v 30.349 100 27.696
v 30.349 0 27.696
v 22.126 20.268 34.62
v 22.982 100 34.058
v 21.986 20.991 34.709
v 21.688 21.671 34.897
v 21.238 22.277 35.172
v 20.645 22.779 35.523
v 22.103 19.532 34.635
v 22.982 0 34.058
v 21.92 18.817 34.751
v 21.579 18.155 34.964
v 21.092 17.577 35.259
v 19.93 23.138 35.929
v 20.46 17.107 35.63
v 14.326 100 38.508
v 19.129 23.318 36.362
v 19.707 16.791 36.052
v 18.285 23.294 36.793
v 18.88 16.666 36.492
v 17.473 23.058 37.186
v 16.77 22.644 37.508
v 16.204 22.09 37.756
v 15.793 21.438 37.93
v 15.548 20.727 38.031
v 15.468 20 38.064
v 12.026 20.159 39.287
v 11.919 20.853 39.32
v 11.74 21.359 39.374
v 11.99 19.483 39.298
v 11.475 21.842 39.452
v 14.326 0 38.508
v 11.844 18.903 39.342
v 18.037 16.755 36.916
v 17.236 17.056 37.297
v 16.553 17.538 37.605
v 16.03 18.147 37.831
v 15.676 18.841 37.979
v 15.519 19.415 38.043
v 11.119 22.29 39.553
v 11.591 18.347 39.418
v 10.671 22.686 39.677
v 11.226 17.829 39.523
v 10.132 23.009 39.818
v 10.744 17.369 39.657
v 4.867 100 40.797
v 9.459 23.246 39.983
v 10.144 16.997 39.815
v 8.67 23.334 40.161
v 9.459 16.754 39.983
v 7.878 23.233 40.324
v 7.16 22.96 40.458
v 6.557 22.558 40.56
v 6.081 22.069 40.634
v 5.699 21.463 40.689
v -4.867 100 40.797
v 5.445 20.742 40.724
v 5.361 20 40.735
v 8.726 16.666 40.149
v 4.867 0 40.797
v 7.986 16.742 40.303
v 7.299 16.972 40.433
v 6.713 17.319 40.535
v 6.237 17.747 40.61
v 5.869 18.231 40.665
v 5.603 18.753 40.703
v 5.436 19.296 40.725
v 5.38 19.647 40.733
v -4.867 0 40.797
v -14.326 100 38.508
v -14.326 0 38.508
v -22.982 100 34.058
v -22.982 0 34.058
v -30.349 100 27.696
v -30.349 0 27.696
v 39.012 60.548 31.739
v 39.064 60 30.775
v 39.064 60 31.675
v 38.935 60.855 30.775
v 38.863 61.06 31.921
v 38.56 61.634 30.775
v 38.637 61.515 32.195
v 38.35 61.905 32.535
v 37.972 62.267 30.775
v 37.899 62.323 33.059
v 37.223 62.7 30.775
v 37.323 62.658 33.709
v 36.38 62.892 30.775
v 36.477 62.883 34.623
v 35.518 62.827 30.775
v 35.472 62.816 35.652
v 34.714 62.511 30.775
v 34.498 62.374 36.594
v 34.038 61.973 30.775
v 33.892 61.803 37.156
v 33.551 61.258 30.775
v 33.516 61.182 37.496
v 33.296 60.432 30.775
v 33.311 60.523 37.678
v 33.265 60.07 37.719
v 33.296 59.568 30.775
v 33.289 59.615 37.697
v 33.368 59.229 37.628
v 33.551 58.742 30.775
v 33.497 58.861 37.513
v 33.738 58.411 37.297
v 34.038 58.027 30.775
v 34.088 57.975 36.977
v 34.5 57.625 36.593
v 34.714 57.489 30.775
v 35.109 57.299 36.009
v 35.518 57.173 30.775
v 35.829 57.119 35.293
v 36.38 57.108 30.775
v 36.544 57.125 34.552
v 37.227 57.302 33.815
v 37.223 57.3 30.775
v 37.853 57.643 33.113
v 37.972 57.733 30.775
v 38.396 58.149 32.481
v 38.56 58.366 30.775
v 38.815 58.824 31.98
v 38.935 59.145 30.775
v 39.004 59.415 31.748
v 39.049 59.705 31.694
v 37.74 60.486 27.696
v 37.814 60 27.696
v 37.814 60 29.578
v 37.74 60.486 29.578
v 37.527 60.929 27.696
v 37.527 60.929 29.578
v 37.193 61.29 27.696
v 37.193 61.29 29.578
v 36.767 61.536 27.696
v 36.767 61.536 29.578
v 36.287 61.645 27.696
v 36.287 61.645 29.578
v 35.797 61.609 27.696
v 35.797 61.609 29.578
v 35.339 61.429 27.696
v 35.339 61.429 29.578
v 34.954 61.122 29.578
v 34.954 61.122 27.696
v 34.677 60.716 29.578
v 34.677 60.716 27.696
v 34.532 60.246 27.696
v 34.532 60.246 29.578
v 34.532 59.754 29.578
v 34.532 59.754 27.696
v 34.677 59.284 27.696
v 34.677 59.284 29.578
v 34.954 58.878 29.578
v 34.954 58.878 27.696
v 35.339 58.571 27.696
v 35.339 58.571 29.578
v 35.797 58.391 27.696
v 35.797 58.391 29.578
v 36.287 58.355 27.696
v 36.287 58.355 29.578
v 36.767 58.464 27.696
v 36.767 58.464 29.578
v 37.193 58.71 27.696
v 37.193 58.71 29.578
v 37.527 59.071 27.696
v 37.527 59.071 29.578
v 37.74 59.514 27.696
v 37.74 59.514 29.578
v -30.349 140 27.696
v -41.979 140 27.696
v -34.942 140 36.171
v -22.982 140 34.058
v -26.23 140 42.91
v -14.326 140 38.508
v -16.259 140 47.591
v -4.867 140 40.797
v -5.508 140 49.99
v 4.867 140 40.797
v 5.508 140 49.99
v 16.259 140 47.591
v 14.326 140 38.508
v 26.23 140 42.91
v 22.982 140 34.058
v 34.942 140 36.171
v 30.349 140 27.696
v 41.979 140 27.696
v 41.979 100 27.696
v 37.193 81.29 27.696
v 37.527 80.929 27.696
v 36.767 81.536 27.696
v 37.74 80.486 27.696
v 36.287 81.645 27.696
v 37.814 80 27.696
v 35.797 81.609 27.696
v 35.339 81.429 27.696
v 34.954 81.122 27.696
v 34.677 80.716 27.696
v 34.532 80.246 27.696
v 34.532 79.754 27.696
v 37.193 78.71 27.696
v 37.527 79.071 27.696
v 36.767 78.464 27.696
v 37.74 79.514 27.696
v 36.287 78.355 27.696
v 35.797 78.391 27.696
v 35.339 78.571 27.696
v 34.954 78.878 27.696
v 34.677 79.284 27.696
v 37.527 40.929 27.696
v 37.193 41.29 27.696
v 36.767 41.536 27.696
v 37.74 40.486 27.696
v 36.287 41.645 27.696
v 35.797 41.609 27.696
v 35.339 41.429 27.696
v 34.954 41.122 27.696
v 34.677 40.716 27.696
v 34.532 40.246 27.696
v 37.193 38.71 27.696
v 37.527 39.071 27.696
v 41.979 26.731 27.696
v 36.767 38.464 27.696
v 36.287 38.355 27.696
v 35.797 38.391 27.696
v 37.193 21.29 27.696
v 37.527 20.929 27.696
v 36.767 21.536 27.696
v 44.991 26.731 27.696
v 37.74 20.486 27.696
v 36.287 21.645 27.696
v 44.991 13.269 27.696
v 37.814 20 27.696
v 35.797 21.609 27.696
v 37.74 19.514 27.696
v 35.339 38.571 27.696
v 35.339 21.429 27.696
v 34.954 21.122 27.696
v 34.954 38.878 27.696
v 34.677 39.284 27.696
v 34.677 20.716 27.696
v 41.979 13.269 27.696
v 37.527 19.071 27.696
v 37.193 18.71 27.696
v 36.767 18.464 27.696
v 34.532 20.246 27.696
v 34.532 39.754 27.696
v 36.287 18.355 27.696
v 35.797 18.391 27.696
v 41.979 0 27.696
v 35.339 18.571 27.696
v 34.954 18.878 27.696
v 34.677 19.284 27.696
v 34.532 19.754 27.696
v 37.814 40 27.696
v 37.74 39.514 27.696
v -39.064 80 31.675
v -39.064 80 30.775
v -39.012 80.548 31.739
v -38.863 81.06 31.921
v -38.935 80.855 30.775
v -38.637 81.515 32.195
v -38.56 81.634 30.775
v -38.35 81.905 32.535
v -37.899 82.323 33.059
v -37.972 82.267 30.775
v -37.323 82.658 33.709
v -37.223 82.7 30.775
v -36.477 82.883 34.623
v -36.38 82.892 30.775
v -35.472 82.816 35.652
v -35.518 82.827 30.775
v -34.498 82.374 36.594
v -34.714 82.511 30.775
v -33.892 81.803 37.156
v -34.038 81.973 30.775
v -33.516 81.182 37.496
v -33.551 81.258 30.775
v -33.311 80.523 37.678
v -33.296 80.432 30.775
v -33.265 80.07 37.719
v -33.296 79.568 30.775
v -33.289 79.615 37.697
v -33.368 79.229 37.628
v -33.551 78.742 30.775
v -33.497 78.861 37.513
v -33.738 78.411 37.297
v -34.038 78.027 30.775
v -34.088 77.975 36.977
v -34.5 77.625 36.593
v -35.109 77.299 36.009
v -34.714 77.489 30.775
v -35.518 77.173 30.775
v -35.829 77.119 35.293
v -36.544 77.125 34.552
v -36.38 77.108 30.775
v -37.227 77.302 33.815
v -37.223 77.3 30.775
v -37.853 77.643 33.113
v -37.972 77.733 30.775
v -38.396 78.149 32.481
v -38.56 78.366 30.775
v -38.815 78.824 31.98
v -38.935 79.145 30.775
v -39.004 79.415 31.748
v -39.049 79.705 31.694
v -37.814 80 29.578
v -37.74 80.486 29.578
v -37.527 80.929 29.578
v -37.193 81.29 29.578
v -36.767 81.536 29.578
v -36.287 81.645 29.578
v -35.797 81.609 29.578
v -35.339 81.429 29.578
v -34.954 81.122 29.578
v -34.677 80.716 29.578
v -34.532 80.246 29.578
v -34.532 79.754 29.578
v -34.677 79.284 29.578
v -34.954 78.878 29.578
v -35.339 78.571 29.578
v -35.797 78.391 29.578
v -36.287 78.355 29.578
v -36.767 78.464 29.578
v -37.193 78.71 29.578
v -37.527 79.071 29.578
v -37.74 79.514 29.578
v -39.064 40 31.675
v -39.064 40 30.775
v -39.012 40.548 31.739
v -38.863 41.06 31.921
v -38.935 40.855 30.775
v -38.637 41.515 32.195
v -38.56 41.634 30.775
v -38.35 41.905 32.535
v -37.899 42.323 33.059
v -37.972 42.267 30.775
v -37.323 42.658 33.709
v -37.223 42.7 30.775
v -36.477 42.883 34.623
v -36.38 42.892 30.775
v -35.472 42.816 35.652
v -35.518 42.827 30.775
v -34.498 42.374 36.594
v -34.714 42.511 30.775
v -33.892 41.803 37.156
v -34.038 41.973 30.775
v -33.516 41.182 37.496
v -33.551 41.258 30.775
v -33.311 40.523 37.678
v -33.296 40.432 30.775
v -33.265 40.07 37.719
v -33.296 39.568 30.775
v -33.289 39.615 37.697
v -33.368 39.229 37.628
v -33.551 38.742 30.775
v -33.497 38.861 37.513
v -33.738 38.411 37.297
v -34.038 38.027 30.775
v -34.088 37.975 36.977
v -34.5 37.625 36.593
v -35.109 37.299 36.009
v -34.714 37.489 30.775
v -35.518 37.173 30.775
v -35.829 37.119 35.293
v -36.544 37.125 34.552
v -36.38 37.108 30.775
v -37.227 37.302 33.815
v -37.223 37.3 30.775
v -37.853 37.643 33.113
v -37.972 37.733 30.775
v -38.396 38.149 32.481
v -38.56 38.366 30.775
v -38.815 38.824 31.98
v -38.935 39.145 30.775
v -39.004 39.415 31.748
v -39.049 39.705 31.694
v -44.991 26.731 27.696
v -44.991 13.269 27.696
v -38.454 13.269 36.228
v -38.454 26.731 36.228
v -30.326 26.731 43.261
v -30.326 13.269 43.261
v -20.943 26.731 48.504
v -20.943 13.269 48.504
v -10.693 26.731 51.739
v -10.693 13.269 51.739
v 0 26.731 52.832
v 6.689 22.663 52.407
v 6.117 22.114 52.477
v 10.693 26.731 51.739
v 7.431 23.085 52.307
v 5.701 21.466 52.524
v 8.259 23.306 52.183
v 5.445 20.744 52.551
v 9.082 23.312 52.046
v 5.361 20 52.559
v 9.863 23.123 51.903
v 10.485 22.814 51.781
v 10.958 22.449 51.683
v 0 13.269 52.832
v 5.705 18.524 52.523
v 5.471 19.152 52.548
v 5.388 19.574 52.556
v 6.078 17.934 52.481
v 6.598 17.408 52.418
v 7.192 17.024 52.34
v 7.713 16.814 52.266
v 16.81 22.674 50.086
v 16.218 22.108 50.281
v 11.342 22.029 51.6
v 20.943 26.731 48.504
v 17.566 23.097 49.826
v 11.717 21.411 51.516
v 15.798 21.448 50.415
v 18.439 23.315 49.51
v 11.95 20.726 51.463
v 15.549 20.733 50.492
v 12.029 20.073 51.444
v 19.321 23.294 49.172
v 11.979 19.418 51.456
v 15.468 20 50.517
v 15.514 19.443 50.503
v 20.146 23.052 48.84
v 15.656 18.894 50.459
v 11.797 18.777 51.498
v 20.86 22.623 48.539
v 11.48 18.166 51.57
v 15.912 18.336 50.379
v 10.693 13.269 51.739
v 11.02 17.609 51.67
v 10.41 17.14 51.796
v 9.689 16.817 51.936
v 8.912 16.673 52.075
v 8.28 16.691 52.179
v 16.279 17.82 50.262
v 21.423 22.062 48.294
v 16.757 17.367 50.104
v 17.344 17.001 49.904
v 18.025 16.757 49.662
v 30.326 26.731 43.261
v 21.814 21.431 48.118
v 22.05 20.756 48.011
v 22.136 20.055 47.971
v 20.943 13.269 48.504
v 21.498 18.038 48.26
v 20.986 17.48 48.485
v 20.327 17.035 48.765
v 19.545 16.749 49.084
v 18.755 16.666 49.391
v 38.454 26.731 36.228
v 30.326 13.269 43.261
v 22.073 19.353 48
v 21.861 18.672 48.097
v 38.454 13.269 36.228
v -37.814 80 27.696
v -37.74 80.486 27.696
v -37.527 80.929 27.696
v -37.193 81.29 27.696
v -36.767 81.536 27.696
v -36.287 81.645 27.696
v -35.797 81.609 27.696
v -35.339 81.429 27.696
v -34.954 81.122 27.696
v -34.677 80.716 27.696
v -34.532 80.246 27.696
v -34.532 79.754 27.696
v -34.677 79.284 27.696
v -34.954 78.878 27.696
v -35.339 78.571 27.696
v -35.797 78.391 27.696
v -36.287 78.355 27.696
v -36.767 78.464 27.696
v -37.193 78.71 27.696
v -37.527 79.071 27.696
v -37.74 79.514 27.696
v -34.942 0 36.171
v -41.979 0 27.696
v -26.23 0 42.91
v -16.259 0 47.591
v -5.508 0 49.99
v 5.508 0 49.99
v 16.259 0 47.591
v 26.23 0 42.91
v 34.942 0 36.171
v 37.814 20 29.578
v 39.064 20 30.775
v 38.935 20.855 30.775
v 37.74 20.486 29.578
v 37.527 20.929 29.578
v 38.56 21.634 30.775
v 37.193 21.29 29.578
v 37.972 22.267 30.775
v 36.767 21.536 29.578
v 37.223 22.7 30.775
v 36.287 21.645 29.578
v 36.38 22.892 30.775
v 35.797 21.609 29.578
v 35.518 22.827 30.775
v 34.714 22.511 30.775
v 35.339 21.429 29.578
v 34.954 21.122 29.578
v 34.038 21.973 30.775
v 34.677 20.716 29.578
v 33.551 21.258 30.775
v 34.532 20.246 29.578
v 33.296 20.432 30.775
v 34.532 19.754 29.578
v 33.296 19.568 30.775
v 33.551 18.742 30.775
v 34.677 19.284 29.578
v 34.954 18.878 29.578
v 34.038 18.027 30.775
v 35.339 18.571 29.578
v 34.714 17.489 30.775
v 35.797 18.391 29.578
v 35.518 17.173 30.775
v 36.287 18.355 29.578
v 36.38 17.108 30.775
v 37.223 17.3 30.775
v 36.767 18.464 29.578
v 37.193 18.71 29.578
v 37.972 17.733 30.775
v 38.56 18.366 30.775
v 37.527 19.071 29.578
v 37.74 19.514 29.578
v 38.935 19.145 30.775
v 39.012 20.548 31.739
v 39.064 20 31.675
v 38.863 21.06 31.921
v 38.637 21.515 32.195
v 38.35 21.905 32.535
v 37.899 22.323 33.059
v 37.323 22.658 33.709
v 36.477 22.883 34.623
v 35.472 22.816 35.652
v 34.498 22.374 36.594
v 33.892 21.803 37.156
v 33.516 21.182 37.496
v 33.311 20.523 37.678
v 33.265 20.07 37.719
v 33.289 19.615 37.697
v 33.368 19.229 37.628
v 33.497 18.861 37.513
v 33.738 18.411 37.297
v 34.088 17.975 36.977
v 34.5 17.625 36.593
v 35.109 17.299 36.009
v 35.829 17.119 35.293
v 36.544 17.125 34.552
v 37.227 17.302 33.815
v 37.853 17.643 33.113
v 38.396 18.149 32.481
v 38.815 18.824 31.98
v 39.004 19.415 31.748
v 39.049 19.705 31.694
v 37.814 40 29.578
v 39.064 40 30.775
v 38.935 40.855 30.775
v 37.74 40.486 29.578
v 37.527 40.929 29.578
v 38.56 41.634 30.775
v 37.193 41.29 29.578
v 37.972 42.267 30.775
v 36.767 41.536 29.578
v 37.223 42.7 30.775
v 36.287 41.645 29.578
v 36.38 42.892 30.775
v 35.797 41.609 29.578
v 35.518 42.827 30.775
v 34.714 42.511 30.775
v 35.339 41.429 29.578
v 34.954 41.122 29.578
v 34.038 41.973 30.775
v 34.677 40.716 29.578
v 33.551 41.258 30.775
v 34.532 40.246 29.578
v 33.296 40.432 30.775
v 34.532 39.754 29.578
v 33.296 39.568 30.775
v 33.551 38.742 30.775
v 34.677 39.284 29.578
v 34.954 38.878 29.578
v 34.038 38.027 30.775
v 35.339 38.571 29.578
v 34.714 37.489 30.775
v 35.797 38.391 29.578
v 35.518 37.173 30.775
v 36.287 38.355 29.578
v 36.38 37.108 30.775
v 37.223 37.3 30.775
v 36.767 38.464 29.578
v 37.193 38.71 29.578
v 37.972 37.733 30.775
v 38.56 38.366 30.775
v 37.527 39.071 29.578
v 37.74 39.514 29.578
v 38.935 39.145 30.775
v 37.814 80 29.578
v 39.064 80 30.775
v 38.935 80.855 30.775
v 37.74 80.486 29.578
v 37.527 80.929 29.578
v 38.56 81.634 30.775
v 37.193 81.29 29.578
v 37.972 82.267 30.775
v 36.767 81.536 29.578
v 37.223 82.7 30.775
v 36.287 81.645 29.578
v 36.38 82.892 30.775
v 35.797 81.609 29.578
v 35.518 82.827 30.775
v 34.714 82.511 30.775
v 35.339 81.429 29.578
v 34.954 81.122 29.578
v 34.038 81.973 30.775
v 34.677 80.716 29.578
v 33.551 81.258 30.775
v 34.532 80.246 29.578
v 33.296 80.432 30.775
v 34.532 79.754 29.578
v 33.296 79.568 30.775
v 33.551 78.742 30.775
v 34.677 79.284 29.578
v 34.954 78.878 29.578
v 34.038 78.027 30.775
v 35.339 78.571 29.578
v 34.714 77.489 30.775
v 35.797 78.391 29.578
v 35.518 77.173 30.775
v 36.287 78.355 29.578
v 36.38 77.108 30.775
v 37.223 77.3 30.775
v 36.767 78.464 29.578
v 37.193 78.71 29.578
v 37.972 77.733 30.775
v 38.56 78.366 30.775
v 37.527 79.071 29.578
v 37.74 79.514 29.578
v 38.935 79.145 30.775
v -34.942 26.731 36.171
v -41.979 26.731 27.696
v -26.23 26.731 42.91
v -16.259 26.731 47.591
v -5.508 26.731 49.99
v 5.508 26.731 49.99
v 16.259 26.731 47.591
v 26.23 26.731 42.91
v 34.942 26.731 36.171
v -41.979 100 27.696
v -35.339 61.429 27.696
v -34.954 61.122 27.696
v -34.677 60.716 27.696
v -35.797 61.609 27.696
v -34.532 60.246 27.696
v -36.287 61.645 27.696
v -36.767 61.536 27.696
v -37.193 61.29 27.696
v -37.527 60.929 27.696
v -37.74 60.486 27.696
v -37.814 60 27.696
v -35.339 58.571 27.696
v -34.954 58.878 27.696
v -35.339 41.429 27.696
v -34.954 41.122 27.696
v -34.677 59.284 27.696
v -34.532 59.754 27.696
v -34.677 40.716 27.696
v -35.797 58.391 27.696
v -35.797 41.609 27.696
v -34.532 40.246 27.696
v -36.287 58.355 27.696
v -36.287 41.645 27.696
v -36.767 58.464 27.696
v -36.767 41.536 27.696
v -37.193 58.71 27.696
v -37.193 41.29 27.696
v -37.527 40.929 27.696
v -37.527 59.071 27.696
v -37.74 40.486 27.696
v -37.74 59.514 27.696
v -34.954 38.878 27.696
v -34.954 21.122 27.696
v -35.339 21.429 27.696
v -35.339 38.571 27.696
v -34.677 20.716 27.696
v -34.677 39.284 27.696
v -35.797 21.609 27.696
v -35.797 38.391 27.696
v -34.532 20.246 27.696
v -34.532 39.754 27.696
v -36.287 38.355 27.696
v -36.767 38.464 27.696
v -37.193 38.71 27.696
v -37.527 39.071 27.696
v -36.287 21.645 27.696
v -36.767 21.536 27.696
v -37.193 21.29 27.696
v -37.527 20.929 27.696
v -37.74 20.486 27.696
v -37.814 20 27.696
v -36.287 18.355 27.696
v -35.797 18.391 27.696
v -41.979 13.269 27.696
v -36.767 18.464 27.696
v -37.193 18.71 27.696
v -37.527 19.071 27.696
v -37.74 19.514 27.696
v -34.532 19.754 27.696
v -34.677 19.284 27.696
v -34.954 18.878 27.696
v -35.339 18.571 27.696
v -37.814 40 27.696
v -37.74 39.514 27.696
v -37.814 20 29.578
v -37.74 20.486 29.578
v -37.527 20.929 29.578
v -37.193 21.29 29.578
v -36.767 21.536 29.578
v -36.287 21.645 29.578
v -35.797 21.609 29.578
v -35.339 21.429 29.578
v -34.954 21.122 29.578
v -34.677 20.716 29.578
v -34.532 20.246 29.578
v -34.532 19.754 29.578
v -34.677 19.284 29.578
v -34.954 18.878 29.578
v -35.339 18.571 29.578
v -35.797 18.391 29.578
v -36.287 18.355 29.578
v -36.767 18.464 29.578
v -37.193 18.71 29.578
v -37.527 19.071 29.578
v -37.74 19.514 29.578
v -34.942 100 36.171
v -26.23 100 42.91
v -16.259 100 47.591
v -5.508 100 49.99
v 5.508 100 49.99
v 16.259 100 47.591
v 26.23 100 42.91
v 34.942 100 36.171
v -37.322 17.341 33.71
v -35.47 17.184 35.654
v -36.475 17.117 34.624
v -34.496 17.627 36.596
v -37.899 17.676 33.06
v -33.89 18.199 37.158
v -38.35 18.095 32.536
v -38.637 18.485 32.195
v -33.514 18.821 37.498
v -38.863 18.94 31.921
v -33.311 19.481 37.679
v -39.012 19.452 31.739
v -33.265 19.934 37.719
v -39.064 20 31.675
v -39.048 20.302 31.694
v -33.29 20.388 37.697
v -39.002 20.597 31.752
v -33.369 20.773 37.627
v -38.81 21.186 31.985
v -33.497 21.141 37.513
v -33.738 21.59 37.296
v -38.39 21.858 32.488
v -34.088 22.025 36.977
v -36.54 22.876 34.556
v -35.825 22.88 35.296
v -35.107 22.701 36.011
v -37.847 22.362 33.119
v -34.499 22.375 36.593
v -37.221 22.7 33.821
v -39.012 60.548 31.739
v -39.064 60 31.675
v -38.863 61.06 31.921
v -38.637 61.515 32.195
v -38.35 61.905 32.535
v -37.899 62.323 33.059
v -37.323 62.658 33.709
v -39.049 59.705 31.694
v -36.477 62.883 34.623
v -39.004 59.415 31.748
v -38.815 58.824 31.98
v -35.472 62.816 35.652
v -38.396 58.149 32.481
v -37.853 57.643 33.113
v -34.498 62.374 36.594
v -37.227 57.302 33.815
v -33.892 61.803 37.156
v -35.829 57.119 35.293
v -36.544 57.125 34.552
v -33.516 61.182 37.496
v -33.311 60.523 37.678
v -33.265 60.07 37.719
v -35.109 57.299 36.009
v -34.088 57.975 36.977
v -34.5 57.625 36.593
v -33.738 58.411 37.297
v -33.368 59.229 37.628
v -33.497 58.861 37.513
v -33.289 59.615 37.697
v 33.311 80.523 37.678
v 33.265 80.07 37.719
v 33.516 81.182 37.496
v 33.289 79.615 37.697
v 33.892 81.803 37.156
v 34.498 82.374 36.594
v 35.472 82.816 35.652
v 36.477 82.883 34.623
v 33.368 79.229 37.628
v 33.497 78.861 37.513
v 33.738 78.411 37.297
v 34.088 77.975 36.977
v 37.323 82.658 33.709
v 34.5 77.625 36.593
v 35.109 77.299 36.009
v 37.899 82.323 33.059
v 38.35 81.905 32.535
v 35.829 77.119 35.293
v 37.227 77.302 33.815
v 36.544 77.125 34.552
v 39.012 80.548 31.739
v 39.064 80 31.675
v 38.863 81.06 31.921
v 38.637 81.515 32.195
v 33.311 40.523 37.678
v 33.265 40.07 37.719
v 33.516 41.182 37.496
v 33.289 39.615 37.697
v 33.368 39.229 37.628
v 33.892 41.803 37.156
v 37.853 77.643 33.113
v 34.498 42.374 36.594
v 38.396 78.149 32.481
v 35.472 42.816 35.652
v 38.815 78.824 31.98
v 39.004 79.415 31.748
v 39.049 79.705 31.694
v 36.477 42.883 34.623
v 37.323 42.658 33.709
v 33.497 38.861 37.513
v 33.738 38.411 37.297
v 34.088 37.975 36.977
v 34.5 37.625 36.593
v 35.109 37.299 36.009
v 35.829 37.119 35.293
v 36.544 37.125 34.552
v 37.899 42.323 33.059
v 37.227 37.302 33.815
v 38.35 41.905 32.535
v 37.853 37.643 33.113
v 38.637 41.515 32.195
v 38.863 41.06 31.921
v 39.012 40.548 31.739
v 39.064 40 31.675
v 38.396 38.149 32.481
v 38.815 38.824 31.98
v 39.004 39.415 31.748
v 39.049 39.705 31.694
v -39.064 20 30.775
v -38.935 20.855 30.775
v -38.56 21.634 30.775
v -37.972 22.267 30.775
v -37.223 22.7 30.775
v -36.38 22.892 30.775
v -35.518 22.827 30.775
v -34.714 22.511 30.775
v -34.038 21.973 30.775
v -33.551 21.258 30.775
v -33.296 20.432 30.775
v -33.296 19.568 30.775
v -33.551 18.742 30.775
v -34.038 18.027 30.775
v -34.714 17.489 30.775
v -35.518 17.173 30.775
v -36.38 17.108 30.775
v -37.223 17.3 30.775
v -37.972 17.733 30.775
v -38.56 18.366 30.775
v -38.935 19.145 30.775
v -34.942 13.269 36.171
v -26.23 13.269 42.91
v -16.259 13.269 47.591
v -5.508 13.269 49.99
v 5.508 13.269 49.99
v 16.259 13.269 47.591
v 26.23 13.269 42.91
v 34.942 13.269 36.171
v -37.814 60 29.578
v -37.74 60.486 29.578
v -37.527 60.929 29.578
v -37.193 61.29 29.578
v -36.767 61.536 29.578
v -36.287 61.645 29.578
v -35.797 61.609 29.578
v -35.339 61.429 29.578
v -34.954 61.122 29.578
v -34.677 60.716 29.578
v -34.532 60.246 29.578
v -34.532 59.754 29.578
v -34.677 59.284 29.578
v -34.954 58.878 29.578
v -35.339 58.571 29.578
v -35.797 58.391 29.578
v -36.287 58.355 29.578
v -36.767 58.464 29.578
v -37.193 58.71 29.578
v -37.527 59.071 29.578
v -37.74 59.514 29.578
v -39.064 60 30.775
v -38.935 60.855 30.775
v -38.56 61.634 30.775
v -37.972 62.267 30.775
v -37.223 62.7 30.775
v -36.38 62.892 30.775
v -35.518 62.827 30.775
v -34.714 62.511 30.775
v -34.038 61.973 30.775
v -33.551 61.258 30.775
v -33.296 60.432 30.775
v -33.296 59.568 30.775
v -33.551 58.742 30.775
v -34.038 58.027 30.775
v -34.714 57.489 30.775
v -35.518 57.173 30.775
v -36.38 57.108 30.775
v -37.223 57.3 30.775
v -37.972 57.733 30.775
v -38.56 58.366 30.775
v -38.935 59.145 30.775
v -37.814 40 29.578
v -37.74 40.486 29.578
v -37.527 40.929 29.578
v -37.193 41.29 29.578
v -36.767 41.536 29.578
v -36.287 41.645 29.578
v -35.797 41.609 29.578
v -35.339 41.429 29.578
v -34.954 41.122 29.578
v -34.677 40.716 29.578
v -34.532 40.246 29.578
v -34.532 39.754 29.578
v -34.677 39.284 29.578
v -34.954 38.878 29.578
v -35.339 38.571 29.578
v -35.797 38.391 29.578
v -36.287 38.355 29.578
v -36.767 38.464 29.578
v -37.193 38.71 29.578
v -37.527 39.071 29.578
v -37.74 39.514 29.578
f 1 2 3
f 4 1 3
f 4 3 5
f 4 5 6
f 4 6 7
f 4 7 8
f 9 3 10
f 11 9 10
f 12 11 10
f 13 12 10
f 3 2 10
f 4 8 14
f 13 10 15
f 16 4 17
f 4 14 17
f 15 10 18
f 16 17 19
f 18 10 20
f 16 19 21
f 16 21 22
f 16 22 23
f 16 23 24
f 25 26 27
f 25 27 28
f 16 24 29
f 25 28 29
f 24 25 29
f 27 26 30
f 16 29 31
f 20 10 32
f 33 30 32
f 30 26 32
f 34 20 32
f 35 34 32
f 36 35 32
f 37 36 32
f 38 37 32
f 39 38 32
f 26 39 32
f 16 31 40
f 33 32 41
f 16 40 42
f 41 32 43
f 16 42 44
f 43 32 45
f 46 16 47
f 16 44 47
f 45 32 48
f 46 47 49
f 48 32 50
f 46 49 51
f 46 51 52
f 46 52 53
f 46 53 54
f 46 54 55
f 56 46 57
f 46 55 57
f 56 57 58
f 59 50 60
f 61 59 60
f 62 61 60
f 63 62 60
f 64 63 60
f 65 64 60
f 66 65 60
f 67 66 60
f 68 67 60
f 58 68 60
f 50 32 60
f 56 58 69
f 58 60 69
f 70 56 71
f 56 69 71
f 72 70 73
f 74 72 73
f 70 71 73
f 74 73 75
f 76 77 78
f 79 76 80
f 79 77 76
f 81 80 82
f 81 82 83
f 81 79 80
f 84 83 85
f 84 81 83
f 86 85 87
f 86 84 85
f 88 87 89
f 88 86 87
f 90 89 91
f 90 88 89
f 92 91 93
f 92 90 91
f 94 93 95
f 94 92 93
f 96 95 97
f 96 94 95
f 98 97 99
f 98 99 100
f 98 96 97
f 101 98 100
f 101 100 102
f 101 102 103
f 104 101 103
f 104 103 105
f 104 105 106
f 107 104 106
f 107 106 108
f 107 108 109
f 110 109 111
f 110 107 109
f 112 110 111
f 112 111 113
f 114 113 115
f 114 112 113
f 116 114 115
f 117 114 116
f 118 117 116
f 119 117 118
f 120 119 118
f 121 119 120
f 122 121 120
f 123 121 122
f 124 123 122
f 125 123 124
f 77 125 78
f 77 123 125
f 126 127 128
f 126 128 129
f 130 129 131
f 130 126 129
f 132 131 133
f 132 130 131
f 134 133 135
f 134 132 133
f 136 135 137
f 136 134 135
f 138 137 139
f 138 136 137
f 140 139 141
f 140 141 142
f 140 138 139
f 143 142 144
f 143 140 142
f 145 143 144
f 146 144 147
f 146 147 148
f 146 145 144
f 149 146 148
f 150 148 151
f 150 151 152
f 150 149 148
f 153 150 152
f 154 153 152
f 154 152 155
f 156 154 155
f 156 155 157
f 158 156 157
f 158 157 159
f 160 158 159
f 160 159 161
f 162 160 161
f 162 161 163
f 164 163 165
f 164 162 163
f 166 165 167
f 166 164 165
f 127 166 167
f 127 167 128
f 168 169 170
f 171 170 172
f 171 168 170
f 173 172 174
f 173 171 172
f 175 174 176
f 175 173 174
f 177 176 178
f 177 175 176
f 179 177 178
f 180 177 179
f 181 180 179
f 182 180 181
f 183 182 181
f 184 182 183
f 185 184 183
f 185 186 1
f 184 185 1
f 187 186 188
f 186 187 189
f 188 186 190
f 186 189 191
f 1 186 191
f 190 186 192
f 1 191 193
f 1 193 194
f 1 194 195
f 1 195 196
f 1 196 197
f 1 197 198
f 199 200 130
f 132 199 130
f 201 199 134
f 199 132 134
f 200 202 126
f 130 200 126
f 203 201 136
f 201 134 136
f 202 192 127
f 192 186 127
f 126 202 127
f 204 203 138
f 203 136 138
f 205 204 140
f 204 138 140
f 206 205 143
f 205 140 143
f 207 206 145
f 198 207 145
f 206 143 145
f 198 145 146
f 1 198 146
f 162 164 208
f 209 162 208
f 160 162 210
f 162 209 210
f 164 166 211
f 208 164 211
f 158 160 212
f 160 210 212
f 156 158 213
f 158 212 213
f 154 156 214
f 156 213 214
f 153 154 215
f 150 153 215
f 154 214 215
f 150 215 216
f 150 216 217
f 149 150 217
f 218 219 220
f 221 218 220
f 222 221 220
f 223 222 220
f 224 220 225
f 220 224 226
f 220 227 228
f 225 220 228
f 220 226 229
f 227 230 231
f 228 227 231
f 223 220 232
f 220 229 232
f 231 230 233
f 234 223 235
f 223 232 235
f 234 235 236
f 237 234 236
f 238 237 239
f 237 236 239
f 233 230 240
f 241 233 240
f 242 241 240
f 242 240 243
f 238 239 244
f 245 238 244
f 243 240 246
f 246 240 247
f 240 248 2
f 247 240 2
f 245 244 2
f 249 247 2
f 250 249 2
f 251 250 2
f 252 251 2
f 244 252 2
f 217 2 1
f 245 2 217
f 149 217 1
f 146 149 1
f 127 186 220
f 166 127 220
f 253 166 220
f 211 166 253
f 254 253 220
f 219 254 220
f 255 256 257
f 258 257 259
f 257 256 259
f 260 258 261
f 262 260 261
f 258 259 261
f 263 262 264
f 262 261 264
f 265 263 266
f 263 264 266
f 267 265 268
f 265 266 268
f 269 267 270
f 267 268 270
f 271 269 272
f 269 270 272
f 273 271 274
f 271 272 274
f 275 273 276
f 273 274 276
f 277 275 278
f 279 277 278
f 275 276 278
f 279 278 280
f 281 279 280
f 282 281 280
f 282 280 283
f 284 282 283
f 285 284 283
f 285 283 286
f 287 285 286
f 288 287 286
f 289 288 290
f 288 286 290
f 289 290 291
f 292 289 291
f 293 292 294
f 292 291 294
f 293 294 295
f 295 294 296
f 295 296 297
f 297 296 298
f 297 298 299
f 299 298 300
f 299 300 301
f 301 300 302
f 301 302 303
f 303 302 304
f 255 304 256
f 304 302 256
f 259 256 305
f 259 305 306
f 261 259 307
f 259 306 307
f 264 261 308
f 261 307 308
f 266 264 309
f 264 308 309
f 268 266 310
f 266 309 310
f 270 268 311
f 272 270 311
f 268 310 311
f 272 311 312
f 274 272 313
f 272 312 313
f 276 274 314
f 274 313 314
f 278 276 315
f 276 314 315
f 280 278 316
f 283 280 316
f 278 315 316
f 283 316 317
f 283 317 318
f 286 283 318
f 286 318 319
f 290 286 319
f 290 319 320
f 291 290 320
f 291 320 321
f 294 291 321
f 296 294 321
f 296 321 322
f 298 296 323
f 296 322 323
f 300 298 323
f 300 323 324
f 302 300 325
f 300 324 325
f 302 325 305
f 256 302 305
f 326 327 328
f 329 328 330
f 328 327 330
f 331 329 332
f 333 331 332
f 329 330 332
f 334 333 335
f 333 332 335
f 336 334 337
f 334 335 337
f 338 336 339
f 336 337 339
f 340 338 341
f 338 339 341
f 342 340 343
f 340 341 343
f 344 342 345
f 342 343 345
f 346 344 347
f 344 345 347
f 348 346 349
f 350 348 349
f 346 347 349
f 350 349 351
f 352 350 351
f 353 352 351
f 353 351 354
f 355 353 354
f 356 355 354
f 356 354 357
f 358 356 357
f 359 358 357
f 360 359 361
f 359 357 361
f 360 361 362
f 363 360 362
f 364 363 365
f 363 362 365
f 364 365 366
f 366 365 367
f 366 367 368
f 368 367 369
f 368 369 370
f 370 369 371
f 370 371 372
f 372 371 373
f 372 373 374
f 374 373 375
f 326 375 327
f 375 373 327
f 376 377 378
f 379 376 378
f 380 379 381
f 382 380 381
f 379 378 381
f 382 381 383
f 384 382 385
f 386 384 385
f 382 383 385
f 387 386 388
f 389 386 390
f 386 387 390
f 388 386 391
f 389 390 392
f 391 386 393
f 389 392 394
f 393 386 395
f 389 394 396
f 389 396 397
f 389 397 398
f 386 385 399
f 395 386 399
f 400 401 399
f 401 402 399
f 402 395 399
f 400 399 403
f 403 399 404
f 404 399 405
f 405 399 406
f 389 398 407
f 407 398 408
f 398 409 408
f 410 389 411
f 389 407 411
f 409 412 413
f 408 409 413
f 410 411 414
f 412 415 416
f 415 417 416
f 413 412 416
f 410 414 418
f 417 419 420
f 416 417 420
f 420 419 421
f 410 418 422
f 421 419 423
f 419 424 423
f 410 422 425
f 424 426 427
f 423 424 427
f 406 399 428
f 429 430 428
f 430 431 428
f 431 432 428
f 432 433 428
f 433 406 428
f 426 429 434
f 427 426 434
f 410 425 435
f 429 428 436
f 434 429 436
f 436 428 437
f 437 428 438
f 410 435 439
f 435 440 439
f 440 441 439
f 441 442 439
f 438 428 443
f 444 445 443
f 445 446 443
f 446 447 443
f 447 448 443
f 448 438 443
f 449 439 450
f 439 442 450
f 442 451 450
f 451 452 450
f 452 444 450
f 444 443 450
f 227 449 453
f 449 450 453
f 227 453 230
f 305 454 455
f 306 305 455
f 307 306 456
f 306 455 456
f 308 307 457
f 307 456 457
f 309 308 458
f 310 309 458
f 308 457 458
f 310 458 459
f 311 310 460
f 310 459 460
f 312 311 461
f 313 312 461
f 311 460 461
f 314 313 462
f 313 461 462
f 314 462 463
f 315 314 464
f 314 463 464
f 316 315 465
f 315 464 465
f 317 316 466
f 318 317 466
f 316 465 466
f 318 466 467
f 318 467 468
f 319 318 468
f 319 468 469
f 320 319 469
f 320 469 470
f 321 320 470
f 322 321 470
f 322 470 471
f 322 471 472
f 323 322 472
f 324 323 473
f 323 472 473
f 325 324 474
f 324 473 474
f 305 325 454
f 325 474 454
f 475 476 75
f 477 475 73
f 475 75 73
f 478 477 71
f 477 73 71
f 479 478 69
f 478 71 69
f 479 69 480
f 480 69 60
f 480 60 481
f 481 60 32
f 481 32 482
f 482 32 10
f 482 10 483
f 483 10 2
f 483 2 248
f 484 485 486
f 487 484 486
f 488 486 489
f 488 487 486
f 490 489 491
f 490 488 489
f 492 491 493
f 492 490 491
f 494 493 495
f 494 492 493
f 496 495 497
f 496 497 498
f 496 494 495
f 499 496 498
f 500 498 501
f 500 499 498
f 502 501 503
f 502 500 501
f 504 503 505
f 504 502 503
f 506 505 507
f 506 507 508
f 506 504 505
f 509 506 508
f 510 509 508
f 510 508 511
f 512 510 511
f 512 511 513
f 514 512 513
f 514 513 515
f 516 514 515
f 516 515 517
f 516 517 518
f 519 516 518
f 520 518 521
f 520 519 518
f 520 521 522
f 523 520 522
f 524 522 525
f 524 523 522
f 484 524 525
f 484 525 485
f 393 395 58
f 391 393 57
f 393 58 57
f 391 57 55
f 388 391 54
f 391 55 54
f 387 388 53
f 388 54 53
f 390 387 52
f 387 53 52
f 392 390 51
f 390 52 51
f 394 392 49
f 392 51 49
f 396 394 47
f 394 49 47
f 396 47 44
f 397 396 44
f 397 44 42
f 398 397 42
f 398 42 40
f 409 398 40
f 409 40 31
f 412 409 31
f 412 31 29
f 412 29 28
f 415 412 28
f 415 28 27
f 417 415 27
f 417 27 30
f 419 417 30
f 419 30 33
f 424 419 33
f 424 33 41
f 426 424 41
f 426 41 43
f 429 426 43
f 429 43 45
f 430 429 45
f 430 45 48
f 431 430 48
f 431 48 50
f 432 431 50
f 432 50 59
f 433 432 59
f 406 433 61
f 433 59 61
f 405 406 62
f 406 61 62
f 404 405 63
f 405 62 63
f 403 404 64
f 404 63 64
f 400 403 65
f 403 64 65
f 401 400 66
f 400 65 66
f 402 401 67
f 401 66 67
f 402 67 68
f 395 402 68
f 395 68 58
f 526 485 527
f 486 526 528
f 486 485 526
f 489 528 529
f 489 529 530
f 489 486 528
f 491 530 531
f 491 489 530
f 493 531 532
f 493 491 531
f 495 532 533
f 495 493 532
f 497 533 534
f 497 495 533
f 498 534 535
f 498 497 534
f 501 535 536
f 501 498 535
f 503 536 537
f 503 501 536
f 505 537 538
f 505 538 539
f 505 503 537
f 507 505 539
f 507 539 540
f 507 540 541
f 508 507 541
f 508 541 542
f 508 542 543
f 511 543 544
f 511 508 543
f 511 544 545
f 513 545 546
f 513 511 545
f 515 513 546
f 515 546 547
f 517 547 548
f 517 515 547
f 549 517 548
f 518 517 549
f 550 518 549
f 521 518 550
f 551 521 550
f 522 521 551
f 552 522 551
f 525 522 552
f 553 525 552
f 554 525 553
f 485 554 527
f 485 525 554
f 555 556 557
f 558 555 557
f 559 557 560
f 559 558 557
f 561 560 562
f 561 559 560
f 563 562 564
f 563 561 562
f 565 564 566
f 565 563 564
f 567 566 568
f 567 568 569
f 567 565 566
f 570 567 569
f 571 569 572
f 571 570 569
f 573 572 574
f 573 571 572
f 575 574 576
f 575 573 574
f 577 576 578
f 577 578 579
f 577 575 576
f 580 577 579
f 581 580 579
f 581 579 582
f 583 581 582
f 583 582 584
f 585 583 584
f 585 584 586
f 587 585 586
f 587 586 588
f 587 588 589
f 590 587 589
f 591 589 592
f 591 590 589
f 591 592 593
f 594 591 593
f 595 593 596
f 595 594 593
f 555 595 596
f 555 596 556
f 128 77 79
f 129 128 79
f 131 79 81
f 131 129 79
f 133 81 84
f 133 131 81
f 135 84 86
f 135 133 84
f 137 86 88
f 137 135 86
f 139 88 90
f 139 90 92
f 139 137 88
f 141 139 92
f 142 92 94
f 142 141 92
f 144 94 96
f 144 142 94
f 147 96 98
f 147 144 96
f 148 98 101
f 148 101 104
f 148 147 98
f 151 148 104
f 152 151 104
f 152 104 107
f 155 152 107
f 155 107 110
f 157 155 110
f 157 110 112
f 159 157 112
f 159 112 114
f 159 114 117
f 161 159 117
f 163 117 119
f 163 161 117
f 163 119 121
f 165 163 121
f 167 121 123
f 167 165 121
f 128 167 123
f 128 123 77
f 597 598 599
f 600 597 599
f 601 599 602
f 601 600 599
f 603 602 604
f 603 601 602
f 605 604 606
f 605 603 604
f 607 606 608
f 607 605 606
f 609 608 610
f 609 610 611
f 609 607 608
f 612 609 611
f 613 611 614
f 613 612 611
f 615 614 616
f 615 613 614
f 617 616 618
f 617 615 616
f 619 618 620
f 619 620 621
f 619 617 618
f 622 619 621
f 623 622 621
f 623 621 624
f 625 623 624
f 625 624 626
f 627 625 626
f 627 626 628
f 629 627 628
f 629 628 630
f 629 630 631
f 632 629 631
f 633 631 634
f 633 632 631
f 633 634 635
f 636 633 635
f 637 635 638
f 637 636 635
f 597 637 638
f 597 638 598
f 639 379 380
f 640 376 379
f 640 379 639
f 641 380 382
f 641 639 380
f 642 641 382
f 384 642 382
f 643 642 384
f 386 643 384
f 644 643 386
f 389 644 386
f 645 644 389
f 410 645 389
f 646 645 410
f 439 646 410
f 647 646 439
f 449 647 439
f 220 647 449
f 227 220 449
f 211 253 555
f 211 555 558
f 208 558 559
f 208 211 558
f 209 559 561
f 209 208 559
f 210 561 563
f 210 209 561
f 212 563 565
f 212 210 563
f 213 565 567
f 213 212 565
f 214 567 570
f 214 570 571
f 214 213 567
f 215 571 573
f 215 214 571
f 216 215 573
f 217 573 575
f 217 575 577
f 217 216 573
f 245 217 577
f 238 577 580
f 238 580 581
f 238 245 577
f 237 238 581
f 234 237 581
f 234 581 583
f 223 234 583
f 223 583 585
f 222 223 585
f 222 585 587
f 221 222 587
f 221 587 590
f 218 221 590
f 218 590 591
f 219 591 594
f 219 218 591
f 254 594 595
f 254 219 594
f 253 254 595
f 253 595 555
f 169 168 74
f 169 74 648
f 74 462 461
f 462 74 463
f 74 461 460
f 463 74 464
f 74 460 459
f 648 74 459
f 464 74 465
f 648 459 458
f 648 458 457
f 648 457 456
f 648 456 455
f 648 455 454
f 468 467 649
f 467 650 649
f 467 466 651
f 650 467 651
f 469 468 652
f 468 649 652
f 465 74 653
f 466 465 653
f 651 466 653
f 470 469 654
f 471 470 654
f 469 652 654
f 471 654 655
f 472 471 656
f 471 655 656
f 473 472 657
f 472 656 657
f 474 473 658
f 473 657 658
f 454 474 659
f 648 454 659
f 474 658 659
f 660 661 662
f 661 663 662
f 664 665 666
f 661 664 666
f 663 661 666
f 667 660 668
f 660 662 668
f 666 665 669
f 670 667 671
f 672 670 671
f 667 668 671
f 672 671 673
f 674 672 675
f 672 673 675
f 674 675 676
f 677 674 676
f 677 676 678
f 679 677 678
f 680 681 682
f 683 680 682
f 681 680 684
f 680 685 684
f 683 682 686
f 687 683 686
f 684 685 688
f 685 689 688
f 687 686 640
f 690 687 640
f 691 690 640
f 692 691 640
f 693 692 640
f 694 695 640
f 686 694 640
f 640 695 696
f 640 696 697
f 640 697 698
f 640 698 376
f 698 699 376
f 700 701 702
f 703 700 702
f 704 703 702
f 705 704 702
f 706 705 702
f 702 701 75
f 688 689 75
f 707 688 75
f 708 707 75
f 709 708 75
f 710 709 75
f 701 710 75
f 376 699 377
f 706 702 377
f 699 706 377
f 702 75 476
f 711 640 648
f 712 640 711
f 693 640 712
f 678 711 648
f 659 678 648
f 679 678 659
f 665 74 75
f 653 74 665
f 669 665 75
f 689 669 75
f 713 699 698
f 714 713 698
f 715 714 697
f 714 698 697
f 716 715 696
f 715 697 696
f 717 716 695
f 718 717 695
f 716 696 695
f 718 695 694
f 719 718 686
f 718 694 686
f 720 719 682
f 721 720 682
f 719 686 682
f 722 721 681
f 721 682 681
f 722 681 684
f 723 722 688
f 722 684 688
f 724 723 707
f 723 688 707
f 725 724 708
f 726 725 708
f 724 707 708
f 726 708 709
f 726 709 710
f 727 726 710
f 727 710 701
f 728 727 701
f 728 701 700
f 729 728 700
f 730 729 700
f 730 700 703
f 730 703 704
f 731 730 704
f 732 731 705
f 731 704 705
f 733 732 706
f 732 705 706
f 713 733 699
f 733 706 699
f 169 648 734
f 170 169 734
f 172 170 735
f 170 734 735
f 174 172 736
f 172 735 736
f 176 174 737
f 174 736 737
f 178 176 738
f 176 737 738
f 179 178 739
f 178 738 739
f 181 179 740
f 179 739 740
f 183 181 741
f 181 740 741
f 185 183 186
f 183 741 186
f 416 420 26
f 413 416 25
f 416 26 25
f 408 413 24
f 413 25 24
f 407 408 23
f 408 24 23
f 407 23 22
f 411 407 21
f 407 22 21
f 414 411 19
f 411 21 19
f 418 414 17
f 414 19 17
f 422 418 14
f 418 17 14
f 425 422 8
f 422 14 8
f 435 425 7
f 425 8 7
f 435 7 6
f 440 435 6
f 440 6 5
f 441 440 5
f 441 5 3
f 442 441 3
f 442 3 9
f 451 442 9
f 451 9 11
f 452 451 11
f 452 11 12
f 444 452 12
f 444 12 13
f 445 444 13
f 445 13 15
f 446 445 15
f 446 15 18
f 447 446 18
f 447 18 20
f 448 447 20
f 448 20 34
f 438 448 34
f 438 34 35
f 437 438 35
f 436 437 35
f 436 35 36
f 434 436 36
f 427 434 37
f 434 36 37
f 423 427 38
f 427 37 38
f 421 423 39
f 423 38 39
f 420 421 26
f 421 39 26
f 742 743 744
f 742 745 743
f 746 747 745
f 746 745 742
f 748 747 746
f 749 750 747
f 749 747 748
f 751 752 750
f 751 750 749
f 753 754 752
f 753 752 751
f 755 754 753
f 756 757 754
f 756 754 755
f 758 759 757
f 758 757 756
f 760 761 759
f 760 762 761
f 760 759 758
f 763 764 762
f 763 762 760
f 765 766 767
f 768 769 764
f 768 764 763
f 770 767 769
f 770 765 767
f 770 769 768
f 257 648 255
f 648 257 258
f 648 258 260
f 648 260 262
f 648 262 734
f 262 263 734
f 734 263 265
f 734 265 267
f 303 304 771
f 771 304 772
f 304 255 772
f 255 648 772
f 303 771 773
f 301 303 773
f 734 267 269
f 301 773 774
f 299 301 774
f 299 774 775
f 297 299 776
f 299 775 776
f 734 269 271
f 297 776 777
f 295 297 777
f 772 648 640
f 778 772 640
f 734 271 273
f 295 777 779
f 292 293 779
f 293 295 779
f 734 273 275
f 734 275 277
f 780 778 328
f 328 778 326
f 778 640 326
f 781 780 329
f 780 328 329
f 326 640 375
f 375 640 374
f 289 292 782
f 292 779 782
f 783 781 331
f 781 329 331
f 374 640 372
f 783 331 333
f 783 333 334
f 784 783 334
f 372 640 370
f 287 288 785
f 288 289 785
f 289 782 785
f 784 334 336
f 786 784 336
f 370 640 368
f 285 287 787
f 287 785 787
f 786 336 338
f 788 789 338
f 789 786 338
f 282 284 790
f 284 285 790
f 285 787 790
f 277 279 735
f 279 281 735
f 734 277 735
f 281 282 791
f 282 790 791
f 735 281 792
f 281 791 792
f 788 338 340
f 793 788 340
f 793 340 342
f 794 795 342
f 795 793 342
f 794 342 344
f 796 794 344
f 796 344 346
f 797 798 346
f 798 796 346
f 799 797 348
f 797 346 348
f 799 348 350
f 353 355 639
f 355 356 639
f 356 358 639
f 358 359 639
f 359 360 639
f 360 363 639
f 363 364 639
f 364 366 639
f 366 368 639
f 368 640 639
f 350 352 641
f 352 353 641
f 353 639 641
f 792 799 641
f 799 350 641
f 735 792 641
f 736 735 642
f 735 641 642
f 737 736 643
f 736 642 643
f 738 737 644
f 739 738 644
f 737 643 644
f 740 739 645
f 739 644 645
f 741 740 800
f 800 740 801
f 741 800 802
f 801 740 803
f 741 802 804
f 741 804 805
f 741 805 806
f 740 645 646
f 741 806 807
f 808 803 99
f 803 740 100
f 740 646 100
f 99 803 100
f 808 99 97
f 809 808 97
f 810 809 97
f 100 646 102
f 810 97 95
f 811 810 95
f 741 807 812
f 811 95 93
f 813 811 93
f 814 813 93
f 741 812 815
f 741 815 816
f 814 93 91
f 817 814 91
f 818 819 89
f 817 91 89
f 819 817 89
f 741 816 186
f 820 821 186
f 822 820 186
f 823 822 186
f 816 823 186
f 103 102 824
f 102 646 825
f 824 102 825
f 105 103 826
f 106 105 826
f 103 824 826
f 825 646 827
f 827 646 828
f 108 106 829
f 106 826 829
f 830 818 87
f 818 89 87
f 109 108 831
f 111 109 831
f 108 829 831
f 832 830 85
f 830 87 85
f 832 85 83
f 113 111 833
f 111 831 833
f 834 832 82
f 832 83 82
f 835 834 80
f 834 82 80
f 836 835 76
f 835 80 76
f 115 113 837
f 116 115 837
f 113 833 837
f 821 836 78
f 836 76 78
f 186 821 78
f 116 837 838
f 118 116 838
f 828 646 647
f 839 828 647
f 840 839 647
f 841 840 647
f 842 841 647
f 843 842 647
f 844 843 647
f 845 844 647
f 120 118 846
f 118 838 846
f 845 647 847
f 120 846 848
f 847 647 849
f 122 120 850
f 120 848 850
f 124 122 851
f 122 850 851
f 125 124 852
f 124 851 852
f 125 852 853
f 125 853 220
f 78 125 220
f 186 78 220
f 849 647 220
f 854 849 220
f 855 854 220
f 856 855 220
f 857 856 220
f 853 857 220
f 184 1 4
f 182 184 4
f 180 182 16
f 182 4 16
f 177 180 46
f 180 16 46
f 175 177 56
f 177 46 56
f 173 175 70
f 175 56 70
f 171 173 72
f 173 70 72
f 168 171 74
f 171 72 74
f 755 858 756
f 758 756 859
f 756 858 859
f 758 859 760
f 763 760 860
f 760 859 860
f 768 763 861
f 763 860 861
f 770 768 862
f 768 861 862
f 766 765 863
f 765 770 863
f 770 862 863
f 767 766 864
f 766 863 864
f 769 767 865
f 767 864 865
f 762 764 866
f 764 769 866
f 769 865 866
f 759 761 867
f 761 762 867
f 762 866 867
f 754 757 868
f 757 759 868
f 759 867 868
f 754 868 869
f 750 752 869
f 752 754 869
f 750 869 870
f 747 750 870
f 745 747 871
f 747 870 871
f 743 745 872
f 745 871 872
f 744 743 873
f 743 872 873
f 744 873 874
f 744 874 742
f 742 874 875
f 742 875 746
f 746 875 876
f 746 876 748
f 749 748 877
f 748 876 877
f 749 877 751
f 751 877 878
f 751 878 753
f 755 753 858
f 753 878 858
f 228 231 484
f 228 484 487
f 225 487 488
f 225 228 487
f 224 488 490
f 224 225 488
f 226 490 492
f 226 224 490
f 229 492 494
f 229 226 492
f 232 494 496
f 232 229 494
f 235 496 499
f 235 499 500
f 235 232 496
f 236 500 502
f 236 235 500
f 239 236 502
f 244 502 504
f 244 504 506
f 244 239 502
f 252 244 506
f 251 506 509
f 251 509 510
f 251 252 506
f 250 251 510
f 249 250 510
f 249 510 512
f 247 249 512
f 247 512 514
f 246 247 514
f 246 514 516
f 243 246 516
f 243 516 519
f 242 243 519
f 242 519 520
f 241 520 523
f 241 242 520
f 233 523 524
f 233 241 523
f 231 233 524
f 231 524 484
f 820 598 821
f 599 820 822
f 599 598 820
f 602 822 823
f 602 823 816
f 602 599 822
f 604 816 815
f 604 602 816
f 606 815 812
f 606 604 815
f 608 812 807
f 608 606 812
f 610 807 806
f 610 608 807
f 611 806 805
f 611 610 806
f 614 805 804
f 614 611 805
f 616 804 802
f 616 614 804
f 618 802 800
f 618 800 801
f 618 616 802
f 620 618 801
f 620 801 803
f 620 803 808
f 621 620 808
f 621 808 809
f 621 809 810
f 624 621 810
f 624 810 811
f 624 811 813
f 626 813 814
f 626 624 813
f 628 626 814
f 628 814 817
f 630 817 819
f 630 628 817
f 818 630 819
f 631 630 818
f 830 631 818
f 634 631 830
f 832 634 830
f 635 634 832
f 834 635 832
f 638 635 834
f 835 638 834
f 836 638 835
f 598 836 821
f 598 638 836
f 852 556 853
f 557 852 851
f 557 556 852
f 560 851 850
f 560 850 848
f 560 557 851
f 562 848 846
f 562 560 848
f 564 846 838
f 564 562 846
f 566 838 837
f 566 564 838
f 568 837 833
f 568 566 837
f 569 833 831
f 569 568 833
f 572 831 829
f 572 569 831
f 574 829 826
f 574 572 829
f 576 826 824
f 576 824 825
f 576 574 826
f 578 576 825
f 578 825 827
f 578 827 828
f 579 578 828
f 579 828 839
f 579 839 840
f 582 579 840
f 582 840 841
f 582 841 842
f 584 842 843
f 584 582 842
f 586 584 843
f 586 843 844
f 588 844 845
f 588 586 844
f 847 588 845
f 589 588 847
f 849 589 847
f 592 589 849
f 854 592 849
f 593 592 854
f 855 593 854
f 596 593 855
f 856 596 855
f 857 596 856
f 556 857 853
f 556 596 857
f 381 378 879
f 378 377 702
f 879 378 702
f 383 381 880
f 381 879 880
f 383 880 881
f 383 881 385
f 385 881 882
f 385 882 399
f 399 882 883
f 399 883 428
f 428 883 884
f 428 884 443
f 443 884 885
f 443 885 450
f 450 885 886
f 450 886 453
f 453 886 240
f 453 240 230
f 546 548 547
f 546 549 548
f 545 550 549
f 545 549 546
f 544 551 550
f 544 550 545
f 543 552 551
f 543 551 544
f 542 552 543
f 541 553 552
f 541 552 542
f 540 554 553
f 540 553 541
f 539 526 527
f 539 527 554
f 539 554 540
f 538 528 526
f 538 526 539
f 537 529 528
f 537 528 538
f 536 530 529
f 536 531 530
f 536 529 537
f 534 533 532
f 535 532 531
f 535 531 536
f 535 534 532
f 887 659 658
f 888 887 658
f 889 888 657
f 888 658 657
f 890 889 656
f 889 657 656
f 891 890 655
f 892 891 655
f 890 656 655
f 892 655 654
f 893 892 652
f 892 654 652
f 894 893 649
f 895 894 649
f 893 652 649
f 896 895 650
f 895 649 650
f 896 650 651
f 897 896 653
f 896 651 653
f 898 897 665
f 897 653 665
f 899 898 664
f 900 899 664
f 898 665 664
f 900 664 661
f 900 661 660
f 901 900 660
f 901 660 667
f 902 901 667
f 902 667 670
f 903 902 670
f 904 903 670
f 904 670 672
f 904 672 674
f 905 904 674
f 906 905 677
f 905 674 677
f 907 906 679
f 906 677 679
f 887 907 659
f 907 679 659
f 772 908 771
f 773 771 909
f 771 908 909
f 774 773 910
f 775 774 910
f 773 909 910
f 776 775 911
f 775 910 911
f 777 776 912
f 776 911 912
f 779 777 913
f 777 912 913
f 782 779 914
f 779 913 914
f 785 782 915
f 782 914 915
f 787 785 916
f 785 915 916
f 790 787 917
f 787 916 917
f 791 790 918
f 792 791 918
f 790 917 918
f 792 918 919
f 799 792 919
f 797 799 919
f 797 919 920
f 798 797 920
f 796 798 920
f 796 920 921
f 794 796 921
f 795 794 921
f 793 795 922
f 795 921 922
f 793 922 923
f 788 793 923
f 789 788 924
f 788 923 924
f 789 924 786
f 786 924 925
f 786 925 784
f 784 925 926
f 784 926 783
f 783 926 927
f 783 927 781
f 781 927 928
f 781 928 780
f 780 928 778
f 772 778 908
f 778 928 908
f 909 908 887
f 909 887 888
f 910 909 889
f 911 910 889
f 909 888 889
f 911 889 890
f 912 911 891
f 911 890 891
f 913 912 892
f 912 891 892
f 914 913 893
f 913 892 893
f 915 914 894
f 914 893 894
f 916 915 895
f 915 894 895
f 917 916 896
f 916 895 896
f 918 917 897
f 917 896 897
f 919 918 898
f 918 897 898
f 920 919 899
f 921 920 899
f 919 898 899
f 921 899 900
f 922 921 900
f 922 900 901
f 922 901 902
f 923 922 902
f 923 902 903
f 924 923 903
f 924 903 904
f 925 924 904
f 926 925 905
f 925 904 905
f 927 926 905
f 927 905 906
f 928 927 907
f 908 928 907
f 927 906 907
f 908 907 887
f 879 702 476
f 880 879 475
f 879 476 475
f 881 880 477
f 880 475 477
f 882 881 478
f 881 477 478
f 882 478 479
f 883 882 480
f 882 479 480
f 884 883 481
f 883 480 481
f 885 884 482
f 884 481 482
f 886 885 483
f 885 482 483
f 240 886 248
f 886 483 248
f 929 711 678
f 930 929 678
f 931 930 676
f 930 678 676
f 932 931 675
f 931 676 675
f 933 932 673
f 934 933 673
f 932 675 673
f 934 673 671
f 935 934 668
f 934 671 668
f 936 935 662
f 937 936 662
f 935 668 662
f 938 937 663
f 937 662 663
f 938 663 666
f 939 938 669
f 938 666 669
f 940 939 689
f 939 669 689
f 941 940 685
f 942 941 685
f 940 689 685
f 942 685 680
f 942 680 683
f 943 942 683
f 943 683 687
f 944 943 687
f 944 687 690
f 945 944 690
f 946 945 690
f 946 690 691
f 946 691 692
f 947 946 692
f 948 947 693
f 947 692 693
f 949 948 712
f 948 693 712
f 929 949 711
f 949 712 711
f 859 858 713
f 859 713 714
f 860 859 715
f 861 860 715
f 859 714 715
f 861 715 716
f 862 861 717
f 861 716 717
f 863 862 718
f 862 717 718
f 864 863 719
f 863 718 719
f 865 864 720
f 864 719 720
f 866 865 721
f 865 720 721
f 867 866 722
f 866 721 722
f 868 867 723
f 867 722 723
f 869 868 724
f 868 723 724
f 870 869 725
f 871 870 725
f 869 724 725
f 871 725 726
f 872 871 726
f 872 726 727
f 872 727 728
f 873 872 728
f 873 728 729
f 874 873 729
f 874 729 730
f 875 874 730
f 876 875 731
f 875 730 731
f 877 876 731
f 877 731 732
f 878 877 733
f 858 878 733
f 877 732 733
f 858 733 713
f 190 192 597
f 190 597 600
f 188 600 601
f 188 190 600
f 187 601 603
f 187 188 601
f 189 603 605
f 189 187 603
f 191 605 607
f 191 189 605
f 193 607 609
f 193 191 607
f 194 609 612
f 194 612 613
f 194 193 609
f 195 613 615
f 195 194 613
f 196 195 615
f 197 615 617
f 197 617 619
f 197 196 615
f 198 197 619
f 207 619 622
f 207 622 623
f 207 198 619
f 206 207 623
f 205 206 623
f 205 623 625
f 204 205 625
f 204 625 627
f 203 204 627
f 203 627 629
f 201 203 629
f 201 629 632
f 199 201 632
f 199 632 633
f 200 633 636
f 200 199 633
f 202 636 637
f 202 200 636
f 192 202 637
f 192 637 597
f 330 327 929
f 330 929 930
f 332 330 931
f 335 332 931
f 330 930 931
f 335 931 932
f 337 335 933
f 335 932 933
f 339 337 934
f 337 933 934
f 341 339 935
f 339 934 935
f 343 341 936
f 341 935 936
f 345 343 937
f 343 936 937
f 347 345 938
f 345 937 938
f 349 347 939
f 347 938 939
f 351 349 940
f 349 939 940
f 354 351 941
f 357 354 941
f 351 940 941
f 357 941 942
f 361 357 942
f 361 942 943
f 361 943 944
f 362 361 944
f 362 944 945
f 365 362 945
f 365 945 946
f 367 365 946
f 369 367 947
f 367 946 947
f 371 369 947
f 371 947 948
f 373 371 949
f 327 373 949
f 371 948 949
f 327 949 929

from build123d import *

# Parameters (mm, degrees)
BOSS_EXTRUDE1_DEPTH      = 100
LPATTERN1_COUNT          = 4
LPATTERN1_PITCH          = 20
BOSS_EXTRUDE2_DEPTH      = 6.731
BOSS_EXTRUDE2_DEPTH_BACK = 6.731
SKETCH9_R                = 3.334469726
CUT_EXTRUDE1_DEPTH       = 34
BOSS_EXTRUDE3_DEPTH      = 40


with BuildPart() as part:
    # Sketch1 → Boss-Extrude1 (new body)
    with BuildSketch(Plane(origin=(60.535204745, 0, -85.948449604), x_dir=(1, 0, 0), z_dir=(0, 1, 0))):
        with BuildLine():
            ThreePointArc((-30.186446753, -113.644462538), (-60.535204745, -127.035141416), (-90.883962736, -113.644462538))
            Line((-90.883962736, -113.644462538), (-102.513962844, -113.644462538))
            ThreePointArc((-102.513962844, -113.644462538), (-60.535204745, -136.240449604), (-18.556446645, -113.644462538))
            Line((-18.556446645, -113.644462538), (-30.186446753, -113.644462538))
        make_face()
    extrude(amount=BOSS_EXTRUDE1_DEPTH)

    # Sketch6 → Cut-Revolve4 (revolve, cut)
    with BuildSketch(Plane(origin=(36.163758045, 20, 27.696012934), x_dir=(-1, 0, 0), z_dir=(0, -1, 0))):
        Polygon((0, 1.685394277), (0, -4.78184701), (0, -15.185924704), (-2.9, -15.185924704), (-2.9, -3.079025683), (-1.65, -1.881964943), (-1.65, 1.685394277), align=None)
    cut_revolve4 = revolve(axis=Axis((36.163758045, 20, 26.010618657), (0, 0, 1)), mode=Mode.SUBTRACT)

    # LPattern1: Cut-Revolve4 ×4
    with Locations(*[(0, i * LPATTERN1_PITCH, 0) for i in range(1, LPATTERN1_COUNT)]):
        add(cut_revolve4, mode=Mode.SUBTRACT)

    # Mirror1: Cut-Revolve4 across plane
    add(cut_revolve4.mirror(Plane(origin=(0, 0, 0), x_dir=(0, 0, 1), z_dir=(1, 0, 0))), mode=Mode.SUBTRACT)

    # Mirror1 copy 1 sketch → Mirror1 copy 1 (revolve, cut)
    with BuildSketch(Plane(origin=(-36.163758045, 40, 27.696012934), x_dir=(1, 0, 0), z_dir=(0, -1, 0))):
        Polygon((0, -1.685394277), (0, 4.78184701), (0, 15.185924704), (-2.9, 15.185924704), (-2.9, 3.079025683), (-1.65, 1.881964943), (-1.65, -1.685394277), align=None)
    revolve(axis=Axis((-36.163758045, 40, 26.010618657), (0, 0, -1)), mode=Mode.SUBTRACT)

    # Mirror1 copy 2 sketch → Mirror1 copy 2 (revolve, cut)
    with BuildSketch(Plane(origin=(-36.163758045, 60, 27.696012934), x_dir=(1, 0, 0), z_dir=(0, -1, 0))):
        Polygon((0, -1.685394277), (0, 4.78184701), (0, 15.185924704), (-2.9, 15.185924704), (-2.9, 3.079025683), (-1.65, 1.881964943), (-1.65, -1.685394277), align=None)
    revolve(axis=Axis((-36.163758045, 60, 26.010618657), (0, 0, -1)), mode=Mode.SUBTRACT)

    # Mirror1 copy 3 sketch → Mirror1 copy 3 (revolve, cut)
    with BuildSketch(Plane(origin=(-36.163758045, 80, 27.696012934), x_dir=(1, 0, 0), z_dir=(0, -1, 0))):
        Polygon((0, -1.685394277), (0, 4.78184701), (0, 15.185924704), (-2.9, 15.185924704), (-2.9, 3.079025683), (-1.65, 1.881964943), (-1.65, -1.685394277), align=None)
    revolve(axis=Axis((-36.163758045, 80, 26.010618657), (0, 0, -1)), mode=Mode.SUBTRACT)

    # Sketch7 → Boss-Extrude2 (add, two sides)
    with BuildSketch(Plane(origin=(0, 20, 0), x_dir=(-1, 0, 0), z_dir=(0, -1, 0))) as boss_extrude2_sk:
        with BuildLine():
            Line((-44.990566695, -27.696012934), (-41.978758099, -27.696012934))
            ThreePointArc((-41.978758099, -27.696012934), (0, -50.292), (41.978758099, -27.696012934))
            Line((41.978758099, -27.696012934), (44.990566695, -27.696012934))
            ThreePointArc((44.990566695, -27.696012934), (0, -52.832), (-44.990566695, -27.696012934))
        make_face()
    extrude(amount=BOSS_EXTRUDE2_DEPTH)
    extrude(boss_extrude2_sk.sketch, amount=-BOSS_EXTRUDE2_DEPTH_BACK)

    # Sketch9 → Cut-Extrude1 (cut)
    with BuildSketch(Plane(origin=(0, 0, 27.696012934), x_dir=(-1, 0, 0), z_dir=(0, 0, -1))):
        with Locations((-18.801989508, 20)):
            Circle(SKETCH9_R)
        with Locations((-8.69556827, 20)):
            Circle(SKETCH9_R)
    extrude(amount=-CUT_EXTRUDE1_DEPTH, mode=Mode.SUBTRACT)

    # Sketch10 → Boss-Extrude3 (add)
    with BuildSketch(Plane(origin=(0, 100, 0), x_dir=(1, 0, 0), z_dir=(0, 1, 0))):
        with BuildLine():
            Line((-30.348757991, -27.696012934), (-41.978758099, -27.696012934))
            ThreePointArc((-41.978758099, -27.696012934), (0, -50.292), (41.978758099, -27.696012934))
            Line((41.978758099, -27.696012934), (30.348757991, -27.696012934))
            ThreePointArc((30.348757991, -27.696012934), (0, -41.086691812), (-30.348757991, -27.696012934))
        make_face()
    extrude(amount=BOSS_EXTRUDE3_DEPTH)


solid = part.part
